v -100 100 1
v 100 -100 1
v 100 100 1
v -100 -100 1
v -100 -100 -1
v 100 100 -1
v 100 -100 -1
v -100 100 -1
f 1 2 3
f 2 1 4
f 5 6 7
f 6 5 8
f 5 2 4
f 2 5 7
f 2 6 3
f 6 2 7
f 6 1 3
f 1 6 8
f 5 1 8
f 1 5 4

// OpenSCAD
// Parameters
sheet_length = 200; //[100:400:1]
sheet_width  = 200; //[100:400:1]
sheet_thickness = 2; //[1:4:0.5]

// Robust thickness to avoid degenerate/blank renders
t = (sheet_thickness > 0) ? sheet_thickness : 0.2;

// Geometry (one connected solid)
color([0.85, 0.85, 0.8])
cube([sheet_length, sheet_width, t], center=true);
